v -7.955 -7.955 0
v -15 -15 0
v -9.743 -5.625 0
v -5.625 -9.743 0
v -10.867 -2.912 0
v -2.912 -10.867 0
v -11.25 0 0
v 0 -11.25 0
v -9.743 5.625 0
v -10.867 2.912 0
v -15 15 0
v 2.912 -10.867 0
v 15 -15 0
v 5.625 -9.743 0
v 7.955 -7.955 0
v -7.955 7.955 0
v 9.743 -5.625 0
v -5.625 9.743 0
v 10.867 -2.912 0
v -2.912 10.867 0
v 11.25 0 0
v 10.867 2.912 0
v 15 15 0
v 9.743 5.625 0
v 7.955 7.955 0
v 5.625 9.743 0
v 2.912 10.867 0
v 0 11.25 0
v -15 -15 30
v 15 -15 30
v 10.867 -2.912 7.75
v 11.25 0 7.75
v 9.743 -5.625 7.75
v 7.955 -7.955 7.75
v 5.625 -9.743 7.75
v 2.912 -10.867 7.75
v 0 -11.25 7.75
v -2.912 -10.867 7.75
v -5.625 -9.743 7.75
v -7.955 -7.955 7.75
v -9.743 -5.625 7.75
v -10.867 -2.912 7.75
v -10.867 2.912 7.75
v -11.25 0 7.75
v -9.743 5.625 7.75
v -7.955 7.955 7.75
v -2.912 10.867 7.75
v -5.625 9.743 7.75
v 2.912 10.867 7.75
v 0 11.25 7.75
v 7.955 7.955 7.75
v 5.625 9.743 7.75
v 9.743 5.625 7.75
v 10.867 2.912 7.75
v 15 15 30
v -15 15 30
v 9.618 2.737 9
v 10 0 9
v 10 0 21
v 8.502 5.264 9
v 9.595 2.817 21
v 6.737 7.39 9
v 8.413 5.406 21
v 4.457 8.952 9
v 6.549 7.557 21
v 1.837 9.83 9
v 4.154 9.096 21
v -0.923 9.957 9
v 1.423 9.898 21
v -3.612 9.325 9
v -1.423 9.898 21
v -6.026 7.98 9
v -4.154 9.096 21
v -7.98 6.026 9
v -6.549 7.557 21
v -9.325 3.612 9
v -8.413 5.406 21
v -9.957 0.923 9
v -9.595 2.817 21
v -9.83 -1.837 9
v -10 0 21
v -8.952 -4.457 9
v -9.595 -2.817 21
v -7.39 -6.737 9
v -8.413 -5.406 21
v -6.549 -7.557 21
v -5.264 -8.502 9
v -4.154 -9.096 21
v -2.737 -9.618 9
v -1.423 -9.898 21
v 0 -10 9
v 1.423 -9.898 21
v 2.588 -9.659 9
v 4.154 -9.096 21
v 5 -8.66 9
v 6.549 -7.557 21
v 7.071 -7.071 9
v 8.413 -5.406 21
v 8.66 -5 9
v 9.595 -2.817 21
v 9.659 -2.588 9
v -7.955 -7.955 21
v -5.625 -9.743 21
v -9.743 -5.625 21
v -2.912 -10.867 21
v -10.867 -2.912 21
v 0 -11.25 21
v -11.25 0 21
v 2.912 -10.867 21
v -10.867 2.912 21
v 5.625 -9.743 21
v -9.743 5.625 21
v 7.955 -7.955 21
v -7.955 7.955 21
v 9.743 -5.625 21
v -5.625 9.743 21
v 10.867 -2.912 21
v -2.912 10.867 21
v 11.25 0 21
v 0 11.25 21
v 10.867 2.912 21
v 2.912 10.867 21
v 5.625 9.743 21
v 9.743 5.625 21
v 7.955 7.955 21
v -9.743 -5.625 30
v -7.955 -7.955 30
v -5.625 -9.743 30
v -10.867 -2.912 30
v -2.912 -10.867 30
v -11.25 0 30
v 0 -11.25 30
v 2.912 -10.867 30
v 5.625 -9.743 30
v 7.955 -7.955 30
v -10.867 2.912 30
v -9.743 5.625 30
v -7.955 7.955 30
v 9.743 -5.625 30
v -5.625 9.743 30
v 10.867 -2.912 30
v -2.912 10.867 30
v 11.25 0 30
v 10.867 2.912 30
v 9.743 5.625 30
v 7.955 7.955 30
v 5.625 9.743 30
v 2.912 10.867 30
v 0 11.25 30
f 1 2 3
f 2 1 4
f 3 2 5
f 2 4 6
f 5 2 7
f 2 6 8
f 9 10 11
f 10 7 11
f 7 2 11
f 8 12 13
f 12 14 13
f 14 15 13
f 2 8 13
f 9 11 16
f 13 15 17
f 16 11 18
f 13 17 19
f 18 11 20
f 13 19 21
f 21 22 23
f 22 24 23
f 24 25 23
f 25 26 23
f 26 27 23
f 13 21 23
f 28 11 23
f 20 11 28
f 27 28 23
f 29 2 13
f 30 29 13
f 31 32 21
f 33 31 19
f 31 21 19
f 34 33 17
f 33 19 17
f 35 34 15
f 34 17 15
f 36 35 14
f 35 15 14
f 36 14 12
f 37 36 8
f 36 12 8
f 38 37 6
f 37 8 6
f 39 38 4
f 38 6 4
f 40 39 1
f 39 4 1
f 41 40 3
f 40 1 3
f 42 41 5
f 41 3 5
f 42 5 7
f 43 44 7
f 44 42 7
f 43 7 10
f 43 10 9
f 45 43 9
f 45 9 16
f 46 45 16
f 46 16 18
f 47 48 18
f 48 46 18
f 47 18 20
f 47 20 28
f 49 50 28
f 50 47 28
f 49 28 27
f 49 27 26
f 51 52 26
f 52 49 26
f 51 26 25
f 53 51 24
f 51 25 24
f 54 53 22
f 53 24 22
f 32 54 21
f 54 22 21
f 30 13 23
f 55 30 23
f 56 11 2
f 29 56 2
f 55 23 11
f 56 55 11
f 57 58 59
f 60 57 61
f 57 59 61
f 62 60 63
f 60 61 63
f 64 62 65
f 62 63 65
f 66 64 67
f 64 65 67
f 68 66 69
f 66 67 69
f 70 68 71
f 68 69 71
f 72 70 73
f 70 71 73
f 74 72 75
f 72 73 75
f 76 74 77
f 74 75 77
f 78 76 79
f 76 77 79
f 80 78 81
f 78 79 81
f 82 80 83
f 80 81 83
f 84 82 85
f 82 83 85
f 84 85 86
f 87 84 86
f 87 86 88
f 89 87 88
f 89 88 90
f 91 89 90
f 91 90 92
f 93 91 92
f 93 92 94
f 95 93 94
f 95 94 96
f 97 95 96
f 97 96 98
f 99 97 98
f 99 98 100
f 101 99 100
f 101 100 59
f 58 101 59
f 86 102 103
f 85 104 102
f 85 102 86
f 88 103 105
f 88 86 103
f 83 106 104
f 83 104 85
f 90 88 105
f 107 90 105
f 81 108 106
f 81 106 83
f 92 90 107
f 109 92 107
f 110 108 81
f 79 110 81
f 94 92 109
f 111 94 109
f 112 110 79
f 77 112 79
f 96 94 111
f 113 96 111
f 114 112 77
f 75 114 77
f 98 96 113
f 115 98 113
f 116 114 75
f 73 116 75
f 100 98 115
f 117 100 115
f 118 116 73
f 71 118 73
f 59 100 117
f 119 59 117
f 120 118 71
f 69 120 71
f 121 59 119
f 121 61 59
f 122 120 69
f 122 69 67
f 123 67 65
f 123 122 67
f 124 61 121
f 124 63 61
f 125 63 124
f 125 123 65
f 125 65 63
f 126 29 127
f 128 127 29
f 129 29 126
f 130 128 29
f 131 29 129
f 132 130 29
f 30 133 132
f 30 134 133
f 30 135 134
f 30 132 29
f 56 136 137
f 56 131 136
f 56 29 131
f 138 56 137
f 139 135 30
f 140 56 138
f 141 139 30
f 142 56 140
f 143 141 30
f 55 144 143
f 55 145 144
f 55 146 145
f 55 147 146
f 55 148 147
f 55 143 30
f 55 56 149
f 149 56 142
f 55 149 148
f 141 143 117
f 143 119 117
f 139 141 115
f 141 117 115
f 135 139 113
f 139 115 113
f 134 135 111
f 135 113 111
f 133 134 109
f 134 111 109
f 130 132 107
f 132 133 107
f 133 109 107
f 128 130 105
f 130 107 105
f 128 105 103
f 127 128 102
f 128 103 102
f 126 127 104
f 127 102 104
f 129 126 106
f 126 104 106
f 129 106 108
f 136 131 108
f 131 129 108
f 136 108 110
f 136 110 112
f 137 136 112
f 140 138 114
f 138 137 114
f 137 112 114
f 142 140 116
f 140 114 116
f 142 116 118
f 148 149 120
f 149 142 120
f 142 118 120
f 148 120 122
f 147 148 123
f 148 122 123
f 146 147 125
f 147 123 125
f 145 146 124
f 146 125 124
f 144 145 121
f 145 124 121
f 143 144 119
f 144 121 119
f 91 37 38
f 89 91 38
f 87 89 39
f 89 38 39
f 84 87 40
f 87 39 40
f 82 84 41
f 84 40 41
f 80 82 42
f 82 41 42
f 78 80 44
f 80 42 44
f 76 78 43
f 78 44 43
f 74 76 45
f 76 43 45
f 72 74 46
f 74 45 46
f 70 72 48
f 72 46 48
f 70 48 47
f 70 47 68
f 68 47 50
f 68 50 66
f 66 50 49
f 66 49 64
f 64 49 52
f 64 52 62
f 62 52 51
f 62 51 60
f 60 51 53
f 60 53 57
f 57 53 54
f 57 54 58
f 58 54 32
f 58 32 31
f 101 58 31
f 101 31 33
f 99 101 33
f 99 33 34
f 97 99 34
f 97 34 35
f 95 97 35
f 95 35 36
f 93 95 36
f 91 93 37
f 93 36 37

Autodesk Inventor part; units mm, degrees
ref_plane "YZ Plane" through (0, 0, 0) normal (1, 0, 0) x (0, 1, 0)
sketch "Sketch1" plane through (0, 0, 0) normal (0, 0, 1) x (1, 0, 0)
  circle A0 centre (0, 0) radius 11.25
  line L0 (-15, -15) -> (15, -15)
  line L1 (15, -15) -> (15, 15)
  line L2 (15, 15) -> (-15, 15)
  line L3 (-15, 15) -> (-15, -15)
  point P0 (-15, 0)
  point P1 (0, 15)
  dimension "d0" = 22.5
  dimension "d1" = 30
extrude "Extrusion1" add sketch "Sketch1" along normal blind 30
ref_plane "Work Plane1" through (0, 0, 21) normal (0, 0, 1) x (1, 0, 0)
ref_plane "Work Plane2" through (0, 0, 9) normal (0, 0, -1) x (-1, 0, 0)
sketch "Sketch2" plane through (0, 0, 21) normal (0, 0, 1) x (1, 0, 0)
  circle A0 centre (0, 0) radius 10
  circle A1 centre (0, 0) radius 11.25 projected
  dimension "d6" = 20
extrude "Extrusion2" add sketch "Sketch2" against normal up to surface (12 mm away)
sketch "Sketch3" plane through (0, 0, 0) normal (1, 0, 0) x (0, 1, 0)
  line L0 (15, 30) -> (15, 0) projected
  line L1 (15, 0) -> (11.25, 0) projected
  line L2 (11.25, 0) -> (11.25, 9) projected
  line L3 (11.25, 9) -> (10, 9) projected
  line L4 (10, 9) -> (10, 21) projected
  line L5 (10, 21) -> (11.25, 21) projected
  line L6 (11.25, 21) -> (11.25, 30) projected
  line L7 (11.25, 30) -> (15, 30) projected
  line L8 (-15, 0) -> (-15, 30) projected
  line L9 (-15, 30) -> (-11.25, 30) projected
  line L10 (-11.25, 30) -> (-11.25, 21) projected
  line L11 (-11.25, 21) -> (-10, 21) projected
  line L12 (-10, 21) -> (-10, 9) projected
  line L13 (-10, 9) -> (-11.25, 9) projected
  line L14 (-11.25, 9) -> (-11.25, 0) projected
  line L15 (-11.25, 0) -> (-15, 0) projected
  line L16 (-10, 9) -> (-11.25, 7.75)
  line L17 (0, -4) -> (0, 24) projected
  point P0 (0, 0)
  dimension "d9" = 45
revolve "Revolution1" add sketch "Sketch3" angle 360 about axis through (0, 0, -10) along (0, 0, 1) contours L14 L13 L16
equation "\"d0\" = od + hole_oversize"
equation "\"d6\" = damax"
equation "\"id\" = 8"
equation "\"od\" = 22"
equation "\"hole_oversize\" = 0.5"
equation "\"post_oversize\" = 0"
equation "\"bearing_width\" = 9"
equation "\"d4\" = -bearing_width"
equation "\"d5\" = -bearing_width"
equation "\"damax\" = 20"
properties part number "pinch_wheel_hobbing_jig"
